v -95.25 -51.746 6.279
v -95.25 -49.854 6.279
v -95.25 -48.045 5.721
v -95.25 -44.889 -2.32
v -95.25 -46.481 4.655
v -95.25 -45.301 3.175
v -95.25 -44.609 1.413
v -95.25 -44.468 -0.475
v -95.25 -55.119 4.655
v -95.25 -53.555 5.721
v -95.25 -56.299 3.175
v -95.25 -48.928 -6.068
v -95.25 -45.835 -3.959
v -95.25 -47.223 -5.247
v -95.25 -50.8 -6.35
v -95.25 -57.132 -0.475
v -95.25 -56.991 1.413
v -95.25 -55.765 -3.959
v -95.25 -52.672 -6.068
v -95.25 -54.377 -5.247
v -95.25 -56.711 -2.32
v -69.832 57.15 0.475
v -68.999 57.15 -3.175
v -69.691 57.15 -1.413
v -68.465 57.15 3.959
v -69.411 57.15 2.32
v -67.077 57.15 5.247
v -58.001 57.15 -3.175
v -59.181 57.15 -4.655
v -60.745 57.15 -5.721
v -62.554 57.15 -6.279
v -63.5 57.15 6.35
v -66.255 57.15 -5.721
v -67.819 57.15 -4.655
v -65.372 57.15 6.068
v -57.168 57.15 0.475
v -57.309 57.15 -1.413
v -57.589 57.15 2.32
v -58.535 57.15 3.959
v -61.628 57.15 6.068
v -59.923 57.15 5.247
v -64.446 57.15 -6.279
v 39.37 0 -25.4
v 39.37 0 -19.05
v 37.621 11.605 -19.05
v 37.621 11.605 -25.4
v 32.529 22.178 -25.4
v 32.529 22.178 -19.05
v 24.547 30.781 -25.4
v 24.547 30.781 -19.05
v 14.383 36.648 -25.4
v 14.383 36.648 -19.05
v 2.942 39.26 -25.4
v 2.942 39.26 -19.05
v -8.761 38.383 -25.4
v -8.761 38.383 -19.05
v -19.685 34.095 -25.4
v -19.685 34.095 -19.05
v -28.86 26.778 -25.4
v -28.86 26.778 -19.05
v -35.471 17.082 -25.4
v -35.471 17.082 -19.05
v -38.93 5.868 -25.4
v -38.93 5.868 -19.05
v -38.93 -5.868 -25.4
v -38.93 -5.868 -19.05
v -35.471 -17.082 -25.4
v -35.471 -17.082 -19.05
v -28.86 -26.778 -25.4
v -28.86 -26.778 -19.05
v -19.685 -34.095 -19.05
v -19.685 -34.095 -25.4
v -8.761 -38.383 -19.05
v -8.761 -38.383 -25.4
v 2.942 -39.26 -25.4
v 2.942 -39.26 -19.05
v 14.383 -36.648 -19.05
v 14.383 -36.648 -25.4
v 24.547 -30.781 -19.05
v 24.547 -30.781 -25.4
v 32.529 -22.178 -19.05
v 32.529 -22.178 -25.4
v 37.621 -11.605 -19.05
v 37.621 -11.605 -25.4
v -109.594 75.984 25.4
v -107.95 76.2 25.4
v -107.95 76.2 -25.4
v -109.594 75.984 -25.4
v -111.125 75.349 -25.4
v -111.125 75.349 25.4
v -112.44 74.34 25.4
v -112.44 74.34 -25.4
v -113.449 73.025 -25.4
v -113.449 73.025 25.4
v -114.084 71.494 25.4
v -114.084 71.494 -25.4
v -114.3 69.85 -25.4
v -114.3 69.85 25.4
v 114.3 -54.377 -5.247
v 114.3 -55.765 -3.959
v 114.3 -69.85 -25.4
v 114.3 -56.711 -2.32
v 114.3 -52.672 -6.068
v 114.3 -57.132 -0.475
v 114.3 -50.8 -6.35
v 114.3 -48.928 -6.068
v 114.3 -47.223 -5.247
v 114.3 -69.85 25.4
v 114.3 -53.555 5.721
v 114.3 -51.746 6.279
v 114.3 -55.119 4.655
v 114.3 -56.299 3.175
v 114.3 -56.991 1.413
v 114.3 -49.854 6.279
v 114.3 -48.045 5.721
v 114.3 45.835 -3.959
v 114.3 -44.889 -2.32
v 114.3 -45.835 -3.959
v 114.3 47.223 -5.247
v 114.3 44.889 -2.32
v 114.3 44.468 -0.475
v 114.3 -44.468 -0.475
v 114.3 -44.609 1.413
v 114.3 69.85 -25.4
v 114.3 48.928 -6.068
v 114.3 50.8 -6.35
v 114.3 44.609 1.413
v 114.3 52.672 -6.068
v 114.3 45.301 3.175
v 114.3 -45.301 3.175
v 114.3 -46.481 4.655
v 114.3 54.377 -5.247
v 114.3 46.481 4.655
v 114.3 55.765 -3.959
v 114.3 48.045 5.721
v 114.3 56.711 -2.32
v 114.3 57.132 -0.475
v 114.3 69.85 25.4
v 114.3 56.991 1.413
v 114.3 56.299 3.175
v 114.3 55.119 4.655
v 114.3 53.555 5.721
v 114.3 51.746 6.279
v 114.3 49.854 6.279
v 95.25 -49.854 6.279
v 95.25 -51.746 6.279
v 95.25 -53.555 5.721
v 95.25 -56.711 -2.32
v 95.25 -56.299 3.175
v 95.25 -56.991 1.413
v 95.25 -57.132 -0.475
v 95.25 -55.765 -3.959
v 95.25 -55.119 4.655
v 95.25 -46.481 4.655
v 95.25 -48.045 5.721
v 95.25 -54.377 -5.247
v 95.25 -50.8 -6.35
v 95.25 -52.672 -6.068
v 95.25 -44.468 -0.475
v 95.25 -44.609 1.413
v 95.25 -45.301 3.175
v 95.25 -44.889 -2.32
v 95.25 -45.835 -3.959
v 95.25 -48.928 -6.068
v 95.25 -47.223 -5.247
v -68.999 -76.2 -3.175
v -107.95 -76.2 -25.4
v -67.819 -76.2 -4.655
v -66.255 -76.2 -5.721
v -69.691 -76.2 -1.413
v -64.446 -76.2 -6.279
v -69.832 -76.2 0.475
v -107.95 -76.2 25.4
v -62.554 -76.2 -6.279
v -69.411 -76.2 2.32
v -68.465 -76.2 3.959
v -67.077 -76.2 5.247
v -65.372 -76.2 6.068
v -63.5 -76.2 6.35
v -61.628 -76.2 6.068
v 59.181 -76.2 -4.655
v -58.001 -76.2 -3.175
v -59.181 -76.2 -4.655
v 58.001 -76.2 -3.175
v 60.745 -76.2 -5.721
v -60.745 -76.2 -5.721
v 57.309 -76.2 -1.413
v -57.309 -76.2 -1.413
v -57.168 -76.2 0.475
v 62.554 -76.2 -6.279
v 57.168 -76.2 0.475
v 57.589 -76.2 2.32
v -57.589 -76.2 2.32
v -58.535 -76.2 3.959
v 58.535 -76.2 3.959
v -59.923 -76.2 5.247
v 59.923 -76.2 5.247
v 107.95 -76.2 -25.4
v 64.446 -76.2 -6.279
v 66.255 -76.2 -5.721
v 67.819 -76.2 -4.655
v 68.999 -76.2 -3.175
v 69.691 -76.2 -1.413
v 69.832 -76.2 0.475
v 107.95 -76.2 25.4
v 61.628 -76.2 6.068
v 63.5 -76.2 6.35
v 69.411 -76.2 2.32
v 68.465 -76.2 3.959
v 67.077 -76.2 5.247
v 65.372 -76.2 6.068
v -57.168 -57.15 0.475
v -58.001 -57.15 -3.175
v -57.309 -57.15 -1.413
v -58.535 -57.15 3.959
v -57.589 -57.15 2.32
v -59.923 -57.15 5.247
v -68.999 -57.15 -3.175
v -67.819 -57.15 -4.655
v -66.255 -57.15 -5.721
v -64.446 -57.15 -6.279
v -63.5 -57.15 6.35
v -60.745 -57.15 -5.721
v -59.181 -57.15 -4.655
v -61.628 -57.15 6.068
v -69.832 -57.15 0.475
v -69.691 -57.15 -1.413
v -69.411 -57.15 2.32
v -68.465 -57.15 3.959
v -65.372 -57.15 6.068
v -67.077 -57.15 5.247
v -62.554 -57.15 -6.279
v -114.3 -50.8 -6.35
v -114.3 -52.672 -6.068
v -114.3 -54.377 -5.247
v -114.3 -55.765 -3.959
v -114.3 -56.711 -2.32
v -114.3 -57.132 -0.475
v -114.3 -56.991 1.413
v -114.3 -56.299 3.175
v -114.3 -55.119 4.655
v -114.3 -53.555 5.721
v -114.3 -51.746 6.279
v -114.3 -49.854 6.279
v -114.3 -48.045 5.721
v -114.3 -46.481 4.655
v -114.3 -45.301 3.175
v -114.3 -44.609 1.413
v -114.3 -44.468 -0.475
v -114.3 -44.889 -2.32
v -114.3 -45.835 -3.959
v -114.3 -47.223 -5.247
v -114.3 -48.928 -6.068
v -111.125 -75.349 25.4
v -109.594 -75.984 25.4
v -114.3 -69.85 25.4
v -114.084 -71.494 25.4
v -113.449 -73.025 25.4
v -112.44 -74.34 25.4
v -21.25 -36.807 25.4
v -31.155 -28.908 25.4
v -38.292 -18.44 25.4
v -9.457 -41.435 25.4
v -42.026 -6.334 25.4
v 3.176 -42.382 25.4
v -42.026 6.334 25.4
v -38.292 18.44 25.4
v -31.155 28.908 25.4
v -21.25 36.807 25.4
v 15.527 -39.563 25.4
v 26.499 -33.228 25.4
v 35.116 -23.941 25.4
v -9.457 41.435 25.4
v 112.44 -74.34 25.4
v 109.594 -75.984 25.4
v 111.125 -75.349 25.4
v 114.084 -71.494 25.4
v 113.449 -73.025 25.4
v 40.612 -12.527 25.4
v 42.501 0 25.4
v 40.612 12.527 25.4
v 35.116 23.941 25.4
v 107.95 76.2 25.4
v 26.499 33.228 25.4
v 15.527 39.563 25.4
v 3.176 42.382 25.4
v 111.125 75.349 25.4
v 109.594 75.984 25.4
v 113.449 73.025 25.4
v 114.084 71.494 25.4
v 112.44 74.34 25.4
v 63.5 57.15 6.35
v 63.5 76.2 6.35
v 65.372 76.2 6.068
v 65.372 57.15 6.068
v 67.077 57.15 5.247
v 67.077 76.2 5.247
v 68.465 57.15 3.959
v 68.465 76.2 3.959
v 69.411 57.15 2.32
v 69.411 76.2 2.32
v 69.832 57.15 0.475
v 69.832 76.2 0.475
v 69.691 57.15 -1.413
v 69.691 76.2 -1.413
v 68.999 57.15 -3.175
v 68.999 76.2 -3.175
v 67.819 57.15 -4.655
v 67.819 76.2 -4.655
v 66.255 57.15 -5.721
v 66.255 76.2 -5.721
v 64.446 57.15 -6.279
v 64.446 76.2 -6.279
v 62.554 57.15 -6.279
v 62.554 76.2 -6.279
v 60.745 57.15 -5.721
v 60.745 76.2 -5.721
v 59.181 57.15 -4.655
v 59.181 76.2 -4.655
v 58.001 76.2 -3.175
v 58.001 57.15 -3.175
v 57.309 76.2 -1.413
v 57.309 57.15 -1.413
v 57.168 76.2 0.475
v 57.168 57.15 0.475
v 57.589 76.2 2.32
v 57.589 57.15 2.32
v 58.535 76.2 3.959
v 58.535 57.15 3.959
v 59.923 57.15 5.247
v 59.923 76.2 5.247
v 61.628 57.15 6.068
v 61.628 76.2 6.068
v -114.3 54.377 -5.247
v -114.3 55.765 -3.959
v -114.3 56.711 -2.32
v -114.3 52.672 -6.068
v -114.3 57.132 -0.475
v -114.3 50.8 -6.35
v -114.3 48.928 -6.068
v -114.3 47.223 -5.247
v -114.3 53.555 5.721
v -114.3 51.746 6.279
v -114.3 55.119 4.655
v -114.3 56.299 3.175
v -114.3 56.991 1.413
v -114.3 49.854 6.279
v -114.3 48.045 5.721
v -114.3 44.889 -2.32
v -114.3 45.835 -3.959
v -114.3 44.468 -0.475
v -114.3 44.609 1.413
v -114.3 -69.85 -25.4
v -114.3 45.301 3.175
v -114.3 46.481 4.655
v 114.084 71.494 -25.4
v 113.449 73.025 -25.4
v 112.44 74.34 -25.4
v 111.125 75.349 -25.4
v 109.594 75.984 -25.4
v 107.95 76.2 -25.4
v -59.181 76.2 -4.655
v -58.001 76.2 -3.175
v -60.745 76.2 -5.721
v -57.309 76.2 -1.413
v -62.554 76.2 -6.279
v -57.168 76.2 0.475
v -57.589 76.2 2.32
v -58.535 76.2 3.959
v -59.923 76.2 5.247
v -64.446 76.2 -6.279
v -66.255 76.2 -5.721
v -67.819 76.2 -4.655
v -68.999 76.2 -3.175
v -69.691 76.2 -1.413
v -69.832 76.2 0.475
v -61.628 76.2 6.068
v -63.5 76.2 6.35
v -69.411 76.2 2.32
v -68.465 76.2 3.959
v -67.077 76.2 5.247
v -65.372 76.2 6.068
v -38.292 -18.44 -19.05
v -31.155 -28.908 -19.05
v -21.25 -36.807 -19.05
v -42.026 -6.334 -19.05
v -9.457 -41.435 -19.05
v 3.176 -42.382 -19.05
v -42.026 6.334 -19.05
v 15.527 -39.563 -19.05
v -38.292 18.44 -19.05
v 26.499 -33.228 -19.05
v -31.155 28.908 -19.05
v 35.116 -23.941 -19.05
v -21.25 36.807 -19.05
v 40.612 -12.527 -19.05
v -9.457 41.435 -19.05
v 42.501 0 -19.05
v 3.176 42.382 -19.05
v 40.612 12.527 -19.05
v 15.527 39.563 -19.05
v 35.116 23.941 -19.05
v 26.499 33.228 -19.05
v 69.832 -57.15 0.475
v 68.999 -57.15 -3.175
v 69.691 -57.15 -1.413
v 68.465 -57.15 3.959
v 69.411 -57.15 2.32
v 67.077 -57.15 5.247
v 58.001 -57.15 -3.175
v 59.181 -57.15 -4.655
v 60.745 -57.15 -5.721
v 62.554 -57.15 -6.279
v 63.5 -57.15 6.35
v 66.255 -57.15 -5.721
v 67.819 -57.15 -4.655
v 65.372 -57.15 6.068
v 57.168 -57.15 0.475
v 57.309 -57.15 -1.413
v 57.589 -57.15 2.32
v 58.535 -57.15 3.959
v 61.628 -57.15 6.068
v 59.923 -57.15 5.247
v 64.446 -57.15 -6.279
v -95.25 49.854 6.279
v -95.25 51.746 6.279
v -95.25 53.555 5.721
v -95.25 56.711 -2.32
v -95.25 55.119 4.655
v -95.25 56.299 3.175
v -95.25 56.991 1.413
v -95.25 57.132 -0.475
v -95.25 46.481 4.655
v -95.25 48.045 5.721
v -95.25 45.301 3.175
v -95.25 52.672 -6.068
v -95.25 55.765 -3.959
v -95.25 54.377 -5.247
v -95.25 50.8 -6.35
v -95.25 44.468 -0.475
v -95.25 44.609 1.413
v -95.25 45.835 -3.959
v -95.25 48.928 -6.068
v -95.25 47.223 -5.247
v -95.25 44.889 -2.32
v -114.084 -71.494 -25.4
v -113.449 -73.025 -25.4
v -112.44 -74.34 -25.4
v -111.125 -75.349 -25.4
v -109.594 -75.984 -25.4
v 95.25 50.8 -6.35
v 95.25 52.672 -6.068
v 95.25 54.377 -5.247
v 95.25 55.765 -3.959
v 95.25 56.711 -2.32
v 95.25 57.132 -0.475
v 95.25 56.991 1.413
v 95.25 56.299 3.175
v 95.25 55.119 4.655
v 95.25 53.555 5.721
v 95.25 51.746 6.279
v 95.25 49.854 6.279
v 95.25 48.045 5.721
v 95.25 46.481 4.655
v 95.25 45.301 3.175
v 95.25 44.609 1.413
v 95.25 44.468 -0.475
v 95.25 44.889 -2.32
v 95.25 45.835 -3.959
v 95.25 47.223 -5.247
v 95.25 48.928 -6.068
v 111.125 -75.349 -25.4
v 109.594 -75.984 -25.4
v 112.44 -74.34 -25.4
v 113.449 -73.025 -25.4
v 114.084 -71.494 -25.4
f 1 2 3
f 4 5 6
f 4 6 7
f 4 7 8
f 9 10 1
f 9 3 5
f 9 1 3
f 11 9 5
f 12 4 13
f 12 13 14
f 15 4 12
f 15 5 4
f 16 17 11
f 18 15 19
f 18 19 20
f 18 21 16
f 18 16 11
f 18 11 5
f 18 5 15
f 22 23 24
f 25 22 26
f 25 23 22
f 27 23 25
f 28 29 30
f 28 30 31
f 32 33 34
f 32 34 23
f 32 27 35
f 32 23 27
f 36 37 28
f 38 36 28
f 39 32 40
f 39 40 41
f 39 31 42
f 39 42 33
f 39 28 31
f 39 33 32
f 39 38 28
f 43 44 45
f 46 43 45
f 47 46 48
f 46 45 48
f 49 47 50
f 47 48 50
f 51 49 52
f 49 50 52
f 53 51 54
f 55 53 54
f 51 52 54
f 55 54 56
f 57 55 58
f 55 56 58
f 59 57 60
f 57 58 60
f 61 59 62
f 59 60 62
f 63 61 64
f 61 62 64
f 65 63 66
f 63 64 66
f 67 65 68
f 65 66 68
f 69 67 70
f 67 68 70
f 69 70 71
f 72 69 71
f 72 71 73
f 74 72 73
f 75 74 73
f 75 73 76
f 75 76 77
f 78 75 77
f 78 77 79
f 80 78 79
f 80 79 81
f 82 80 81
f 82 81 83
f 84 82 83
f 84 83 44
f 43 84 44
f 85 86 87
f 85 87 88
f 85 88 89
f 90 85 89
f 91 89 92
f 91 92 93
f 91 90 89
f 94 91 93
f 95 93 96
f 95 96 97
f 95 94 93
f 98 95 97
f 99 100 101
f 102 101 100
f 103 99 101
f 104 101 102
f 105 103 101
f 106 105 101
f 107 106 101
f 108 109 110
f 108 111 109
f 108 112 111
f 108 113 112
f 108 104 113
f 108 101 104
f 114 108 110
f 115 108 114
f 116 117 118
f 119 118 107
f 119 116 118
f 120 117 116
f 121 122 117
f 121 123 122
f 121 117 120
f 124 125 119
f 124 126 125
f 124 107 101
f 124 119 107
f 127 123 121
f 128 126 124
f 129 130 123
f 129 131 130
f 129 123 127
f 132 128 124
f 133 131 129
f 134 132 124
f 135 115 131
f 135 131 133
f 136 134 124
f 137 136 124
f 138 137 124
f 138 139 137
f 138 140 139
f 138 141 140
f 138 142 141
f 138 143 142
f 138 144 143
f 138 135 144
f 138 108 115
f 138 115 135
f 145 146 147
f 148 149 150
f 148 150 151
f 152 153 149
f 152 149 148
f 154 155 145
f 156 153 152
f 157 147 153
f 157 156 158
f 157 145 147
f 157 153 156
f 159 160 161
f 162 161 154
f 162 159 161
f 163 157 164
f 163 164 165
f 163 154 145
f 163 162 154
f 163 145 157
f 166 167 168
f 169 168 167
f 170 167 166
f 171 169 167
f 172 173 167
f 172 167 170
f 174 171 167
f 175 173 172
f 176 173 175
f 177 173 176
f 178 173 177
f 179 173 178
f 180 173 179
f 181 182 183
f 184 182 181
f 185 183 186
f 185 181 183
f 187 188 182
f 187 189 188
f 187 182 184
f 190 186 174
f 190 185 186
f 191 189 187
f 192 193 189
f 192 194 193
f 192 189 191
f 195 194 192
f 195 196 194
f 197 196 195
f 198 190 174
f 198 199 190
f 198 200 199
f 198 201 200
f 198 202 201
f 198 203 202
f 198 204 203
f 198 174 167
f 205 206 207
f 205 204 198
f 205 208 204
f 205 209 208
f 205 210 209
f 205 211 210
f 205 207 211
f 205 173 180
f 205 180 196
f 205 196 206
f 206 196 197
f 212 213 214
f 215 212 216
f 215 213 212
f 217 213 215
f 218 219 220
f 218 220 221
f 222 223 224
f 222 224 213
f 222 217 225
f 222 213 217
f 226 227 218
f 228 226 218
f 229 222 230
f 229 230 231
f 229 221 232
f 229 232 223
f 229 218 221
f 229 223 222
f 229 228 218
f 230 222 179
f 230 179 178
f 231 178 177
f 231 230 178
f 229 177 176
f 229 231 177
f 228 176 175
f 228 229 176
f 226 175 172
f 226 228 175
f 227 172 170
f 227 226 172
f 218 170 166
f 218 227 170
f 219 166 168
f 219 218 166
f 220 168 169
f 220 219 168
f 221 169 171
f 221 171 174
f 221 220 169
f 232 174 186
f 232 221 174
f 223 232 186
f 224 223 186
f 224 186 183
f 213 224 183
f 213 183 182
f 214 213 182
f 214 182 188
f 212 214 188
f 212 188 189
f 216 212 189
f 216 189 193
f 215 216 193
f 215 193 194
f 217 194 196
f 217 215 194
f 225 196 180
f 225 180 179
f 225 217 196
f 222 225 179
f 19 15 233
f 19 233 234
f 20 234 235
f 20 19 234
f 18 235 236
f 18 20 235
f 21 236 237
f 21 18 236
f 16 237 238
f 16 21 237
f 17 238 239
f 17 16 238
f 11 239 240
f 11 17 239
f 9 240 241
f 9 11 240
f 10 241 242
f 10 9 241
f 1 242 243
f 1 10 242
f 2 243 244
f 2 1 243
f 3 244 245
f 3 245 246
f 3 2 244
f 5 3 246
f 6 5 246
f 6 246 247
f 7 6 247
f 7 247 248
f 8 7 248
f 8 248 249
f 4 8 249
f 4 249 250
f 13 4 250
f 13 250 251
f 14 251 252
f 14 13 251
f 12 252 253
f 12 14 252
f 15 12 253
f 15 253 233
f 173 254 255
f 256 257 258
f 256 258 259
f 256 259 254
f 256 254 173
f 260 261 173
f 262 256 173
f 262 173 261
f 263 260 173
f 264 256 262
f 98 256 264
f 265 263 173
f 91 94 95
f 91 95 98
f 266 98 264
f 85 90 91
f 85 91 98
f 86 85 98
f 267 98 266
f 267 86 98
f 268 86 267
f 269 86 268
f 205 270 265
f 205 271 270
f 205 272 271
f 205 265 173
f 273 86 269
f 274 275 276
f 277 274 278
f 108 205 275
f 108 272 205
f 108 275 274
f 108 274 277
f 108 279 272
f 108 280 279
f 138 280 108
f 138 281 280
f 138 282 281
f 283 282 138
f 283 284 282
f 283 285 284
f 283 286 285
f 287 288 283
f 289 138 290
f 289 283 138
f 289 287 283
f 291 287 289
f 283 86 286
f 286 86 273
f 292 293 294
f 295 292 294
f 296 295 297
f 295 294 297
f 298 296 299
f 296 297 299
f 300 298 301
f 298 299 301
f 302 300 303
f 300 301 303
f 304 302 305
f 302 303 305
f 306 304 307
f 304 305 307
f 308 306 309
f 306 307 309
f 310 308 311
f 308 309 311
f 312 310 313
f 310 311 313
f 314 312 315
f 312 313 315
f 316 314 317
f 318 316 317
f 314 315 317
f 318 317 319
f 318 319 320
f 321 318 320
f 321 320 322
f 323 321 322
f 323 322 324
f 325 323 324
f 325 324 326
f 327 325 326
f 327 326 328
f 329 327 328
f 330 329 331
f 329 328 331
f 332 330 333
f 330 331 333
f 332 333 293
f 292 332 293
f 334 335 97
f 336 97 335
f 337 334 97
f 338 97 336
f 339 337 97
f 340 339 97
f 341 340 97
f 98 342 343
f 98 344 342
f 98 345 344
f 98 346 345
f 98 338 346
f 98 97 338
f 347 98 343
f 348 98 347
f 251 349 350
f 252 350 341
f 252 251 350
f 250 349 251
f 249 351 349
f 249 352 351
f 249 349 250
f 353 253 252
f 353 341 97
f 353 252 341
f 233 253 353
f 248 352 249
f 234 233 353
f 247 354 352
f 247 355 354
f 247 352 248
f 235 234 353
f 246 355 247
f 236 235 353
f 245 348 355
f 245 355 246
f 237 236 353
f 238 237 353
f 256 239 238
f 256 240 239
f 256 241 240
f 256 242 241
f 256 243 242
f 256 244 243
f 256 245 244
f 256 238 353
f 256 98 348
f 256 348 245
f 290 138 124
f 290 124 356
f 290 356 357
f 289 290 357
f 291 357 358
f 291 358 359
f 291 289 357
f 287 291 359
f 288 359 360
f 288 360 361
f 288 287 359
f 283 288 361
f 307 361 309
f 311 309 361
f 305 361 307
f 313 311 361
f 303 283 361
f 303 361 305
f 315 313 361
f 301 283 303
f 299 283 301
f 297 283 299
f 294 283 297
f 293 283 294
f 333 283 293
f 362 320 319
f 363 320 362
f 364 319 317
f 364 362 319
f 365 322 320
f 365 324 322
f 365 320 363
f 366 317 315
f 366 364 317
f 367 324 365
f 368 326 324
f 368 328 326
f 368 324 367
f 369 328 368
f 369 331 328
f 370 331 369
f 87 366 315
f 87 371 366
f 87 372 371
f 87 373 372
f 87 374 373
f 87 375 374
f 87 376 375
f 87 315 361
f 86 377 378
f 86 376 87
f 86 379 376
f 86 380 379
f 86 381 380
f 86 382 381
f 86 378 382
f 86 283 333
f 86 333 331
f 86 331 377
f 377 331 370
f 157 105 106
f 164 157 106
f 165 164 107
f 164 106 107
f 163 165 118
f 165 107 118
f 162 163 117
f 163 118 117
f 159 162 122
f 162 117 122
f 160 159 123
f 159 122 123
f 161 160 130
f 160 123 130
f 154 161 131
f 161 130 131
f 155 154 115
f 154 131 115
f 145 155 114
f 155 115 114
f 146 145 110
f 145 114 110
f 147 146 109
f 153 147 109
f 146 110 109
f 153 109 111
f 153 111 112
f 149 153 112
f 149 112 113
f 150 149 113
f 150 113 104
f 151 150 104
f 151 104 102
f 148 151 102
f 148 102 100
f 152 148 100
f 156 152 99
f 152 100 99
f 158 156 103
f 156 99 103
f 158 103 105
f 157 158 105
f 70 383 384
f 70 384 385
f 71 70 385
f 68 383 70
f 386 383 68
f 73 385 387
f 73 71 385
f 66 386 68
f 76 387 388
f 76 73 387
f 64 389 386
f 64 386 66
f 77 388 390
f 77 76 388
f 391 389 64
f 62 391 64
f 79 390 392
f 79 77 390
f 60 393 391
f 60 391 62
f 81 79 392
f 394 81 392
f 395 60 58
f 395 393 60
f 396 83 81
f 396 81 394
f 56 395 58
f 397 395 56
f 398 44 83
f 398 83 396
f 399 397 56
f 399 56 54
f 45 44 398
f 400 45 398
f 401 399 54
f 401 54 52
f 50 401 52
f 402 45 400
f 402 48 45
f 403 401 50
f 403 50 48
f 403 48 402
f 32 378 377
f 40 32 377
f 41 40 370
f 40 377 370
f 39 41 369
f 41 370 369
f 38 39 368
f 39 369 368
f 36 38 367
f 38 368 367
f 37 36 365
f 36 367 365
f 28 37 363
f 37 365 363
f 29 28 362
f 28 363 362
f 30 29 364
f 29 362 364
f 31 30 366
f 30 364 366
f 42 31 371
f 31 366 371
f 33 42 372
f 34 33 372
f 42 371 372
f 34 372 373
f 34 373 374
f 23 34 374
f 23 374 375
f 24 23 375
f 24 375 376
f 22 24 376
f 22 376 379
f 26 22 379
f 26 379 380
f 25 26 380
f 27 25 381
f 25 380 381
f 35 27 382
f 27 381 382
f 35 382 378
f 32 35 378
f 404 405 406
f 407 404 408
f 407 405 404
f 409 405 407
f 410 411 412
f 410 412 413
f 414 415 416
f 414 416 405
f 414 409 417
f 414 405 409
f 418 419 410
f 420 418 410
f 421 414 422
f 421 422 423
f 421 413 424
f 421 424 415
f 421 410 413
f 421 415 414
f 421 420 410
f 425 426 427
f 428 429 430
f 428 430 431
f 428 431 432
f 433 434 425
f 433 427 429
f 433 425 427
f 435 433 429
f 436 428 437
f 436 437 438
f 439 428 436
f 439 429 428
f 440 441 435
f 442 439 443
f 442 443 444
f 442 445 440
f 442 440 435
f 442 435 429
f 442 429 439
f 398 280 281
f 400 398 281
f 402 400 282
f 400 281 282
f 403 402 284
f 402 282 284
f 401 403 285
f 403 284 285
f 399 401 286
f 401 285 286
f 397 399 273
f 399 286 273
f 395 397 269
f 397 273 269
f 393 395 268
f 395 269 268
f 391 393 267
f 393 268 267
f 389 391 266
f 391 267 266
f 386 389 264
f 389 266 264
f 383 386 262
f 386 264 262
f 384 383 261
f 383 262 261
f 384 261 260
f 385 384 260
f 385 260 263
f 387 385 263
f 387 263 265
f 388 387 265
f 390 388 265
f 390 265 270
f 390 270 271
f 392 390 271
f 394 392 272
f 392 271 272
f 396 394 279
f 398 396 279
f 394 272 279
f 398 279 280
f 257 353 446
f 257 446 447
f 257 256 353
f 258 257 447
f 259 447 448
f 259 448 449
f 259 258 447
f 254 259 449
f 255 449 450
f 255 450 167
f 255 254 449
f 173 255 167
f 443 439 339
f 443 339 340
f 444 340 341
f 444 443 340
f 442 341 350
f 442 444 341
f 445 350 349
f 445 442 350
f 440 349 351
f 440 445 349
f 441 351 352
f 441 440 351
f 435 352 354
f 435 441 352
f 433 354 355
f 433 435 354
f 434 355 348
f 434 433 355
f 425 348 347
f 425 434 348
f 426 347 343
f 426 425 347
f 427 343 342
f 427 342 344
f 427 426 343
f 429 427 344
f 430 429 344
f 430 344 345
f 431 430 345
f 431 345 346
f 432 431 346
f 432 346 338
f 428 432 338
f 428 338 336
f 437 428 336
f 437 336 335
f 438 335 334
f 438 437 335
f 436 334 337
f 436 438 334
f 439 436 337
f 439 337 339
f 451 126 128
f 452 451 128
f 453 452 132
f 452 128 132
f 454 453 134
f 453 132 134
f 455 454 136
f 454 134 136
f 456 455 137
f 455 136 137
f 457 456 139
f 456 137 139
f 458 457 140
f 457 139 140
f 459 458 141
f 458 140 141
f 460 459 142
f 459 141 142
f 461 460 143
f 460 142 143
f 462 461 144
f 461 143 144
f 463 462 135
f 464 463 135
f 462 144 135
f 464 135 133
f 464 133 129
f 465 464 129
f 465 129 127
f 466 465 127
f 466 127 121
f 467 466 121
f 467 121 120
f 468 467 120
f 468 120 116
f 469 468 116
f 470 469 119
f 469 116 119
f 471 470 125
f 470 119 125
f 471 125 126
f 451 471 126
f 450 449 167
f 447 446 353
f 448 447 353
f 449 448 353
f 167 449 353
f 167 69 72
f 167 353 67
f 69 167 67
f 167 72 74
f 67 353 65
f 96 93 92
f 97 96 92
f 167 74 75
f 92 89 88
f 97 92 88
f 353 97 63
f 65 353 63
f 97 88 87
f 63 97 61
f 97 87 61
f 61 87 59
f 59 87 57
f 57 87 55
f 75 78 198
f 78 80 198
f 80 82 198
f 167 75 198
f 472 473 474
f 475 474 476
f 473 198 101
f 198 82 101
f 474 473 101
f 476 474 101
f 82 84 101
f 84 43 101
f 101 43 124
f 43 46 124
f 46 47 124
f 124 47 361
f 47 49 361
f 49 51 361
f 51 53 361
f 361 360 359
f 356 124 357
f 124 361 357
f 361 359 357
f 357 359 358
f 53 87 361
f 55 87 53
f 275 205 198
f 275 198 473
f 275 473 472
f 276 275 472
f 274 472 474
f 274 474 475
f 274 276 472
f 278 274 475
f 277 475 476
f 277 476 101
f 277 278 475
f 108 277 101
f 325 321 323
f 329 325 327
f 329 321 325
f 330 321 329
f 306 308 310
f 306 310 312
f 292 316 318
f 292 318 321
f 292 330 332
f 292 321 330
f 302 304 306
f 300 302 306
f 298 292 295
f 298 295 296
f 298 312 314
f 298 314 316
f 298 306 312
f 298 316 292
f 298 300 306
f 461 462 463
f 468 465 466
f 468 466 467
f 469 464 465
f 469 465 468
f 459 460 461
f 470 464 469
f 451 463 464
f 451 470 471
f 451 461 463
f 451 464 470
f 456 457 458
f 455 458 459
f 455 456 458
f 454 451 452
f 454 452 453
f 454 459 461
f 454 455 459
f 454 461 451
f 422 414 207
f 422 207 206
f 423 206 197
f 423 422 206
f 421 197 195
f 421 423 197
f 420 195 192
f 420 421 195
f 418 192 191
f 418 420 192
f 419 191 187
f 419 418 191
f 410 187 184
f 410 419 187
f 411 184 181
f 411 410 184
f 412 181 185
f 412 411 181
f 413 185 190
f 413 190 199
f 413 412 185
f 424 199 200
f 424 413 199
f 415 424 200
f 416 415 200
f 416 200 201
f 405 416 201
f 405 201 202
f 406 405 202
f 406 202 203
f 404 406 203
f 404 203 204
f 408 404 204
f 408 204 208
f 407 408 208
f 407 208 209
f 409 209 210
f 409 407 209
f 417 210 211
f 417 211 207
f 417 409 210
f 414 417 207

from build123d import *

# Parameters (mm, degrees)
BOSS_EXTRUDE1_DEPTH = 25.4
SKETCH2_R           = 42.50055
CUT_EXTRUDE1_DEPTH  = 44.45
SKETCH3_R           = 39.37
CUT_EXTRUDE2_DEPTH  = 31.75
SKETCH4_R           = 6.35
CUT_EXTRUDE3_DEPTH  = 19.05
CUT_EXTRUDE4_START  = -19.05
SKETCH5_R           = 6.35
CUT_EXTRUDE4_DEPTH  = 19.05
SKETCH6_R           = 6.35
CUT_EXTRUDE5_DEPTH  = 19.05
CUT_EXTRUDE6_START  = -19.05
SKETCH7_R           = 6.35
CUT_EXTRUDE6_DEPTH  = 19.05


with BuildPart() as part:
    # Sketch1 → Boss-Extrude1 (new, symmetric)
    with BuildSketch(Plane.XY):
        with BuildLine():
            Line((-107.95, -76.2), (107.95, -76.2))
            ThreePointArc((107.95, -76.2), (112.440128061, -74.340128061), (114.3, -69.85))
            Line((114.3, -69.85), (114.3, 69.85))
            ThreePointArc((114.3, 69.85), (112.440128061, 74.340128061), (107.95, 76.2))
            Line((107.95, 76.2), (-107.95, 76.2))
            ThreePointArc((-107.95, 76.2), (-112.440128061, 74.340128061), (-114.3, 69.85))
            Line((-114.3, 69.85), (-114.3, -69.85))
            ThreePointArc((-114.3, -69.85), (-112.440128061, -74.340128061), (-107.95, -76.2))
        make_face()
    extrude(amount=BOSS_EXTRUDE1_DEPTH, both=True)

    # Sketch2 → Cut-Extrude1 (cut)
    with BuildSketch(Plane.XY.offset(25.4)):
        Circle(SKETCH2_R)
    extrude(amount=-CUT_EXTRUDE1_DEPTH, mode=Mode.SUBTRACT)

    # Sketch3 → Cut-Extrude2 (cut)
    with BuildSketch(Plane.XY.offset(-19.05)):
        Circle(SKETCH3_R)
    extrude(amount=-CUT_EXTRUDE2_DEPTH, mode=Mode.SUBTRACT)

    # Sketch4 → Cut-Extrude3 (cut)
    with BuildSketch(Plane(origin=(0, 76.2, 0), x_dir=(1, 0, 0), z_dir=(0, 1, 0))):
        with Locations(Location((-63.5, 0, 0), (0, 0, 270))):
            Circle(SKETCH4_R)
        with Locations(Location((63.5, 0, 0), (0, 0, 270))):
            Circle(SKETCH4_R)
    extrude(amount=-CUT_EXTRUDE3_DEPTH, mode=Mode.SUBTRACT)

    # Sketch5 → Cut-Extrude4 (cut)
    with BuildSketch(Plane.XZ.offset(76.2).offset(CUT_EXTRUDE4_START)):
        with Locations(Location((-63.5, 0, 0), (0, 0, 90))):
            Circle(SKETCH5_R)
        with Locations(Location((63.5, 0, 0), (0, 0, 90))):
            Circle(SKETCH5_R)
    extrude(amount=CUT_EXTRUDE4_DEPTH, mode=Mode.SUBTRACT)

    # Sketch6 → Cut-Extrude5 (cut)
    with BuildSketch(Plane(origin=(114.3, 0, 0), x_dir=(0, 0, -1), z_dir=(1, 0, 0))):
        with Locations((0, 50.8)):
            Circle(SKETCH6_R)
        with Locations((0, -50.8)):
            Circle(SKETCH6_R)
    extrude(amount=-CUT_EXTRUDE5_DEPTH, mode=Mode.SUBTRACT)

    # Sketch7 → Cut-Extrude6 (cut)
    with BuildSketch(Plane.ZY.offset(114.3).offset(CUT_EXTRUDE6_START)):
        with Locations(Location((0, 50.8, 0), (0, 0, 180))):
            Circle(SKETCH7_R)
        with Locations(Location((0, -50.8, 0), (0, 0, 180))):
            Circle(SKETCH7_R)
    extrude(amount=CUT_EXTRUDE6_DEPTH, mode=Mode.SUBTRACT)


solid = part.part
